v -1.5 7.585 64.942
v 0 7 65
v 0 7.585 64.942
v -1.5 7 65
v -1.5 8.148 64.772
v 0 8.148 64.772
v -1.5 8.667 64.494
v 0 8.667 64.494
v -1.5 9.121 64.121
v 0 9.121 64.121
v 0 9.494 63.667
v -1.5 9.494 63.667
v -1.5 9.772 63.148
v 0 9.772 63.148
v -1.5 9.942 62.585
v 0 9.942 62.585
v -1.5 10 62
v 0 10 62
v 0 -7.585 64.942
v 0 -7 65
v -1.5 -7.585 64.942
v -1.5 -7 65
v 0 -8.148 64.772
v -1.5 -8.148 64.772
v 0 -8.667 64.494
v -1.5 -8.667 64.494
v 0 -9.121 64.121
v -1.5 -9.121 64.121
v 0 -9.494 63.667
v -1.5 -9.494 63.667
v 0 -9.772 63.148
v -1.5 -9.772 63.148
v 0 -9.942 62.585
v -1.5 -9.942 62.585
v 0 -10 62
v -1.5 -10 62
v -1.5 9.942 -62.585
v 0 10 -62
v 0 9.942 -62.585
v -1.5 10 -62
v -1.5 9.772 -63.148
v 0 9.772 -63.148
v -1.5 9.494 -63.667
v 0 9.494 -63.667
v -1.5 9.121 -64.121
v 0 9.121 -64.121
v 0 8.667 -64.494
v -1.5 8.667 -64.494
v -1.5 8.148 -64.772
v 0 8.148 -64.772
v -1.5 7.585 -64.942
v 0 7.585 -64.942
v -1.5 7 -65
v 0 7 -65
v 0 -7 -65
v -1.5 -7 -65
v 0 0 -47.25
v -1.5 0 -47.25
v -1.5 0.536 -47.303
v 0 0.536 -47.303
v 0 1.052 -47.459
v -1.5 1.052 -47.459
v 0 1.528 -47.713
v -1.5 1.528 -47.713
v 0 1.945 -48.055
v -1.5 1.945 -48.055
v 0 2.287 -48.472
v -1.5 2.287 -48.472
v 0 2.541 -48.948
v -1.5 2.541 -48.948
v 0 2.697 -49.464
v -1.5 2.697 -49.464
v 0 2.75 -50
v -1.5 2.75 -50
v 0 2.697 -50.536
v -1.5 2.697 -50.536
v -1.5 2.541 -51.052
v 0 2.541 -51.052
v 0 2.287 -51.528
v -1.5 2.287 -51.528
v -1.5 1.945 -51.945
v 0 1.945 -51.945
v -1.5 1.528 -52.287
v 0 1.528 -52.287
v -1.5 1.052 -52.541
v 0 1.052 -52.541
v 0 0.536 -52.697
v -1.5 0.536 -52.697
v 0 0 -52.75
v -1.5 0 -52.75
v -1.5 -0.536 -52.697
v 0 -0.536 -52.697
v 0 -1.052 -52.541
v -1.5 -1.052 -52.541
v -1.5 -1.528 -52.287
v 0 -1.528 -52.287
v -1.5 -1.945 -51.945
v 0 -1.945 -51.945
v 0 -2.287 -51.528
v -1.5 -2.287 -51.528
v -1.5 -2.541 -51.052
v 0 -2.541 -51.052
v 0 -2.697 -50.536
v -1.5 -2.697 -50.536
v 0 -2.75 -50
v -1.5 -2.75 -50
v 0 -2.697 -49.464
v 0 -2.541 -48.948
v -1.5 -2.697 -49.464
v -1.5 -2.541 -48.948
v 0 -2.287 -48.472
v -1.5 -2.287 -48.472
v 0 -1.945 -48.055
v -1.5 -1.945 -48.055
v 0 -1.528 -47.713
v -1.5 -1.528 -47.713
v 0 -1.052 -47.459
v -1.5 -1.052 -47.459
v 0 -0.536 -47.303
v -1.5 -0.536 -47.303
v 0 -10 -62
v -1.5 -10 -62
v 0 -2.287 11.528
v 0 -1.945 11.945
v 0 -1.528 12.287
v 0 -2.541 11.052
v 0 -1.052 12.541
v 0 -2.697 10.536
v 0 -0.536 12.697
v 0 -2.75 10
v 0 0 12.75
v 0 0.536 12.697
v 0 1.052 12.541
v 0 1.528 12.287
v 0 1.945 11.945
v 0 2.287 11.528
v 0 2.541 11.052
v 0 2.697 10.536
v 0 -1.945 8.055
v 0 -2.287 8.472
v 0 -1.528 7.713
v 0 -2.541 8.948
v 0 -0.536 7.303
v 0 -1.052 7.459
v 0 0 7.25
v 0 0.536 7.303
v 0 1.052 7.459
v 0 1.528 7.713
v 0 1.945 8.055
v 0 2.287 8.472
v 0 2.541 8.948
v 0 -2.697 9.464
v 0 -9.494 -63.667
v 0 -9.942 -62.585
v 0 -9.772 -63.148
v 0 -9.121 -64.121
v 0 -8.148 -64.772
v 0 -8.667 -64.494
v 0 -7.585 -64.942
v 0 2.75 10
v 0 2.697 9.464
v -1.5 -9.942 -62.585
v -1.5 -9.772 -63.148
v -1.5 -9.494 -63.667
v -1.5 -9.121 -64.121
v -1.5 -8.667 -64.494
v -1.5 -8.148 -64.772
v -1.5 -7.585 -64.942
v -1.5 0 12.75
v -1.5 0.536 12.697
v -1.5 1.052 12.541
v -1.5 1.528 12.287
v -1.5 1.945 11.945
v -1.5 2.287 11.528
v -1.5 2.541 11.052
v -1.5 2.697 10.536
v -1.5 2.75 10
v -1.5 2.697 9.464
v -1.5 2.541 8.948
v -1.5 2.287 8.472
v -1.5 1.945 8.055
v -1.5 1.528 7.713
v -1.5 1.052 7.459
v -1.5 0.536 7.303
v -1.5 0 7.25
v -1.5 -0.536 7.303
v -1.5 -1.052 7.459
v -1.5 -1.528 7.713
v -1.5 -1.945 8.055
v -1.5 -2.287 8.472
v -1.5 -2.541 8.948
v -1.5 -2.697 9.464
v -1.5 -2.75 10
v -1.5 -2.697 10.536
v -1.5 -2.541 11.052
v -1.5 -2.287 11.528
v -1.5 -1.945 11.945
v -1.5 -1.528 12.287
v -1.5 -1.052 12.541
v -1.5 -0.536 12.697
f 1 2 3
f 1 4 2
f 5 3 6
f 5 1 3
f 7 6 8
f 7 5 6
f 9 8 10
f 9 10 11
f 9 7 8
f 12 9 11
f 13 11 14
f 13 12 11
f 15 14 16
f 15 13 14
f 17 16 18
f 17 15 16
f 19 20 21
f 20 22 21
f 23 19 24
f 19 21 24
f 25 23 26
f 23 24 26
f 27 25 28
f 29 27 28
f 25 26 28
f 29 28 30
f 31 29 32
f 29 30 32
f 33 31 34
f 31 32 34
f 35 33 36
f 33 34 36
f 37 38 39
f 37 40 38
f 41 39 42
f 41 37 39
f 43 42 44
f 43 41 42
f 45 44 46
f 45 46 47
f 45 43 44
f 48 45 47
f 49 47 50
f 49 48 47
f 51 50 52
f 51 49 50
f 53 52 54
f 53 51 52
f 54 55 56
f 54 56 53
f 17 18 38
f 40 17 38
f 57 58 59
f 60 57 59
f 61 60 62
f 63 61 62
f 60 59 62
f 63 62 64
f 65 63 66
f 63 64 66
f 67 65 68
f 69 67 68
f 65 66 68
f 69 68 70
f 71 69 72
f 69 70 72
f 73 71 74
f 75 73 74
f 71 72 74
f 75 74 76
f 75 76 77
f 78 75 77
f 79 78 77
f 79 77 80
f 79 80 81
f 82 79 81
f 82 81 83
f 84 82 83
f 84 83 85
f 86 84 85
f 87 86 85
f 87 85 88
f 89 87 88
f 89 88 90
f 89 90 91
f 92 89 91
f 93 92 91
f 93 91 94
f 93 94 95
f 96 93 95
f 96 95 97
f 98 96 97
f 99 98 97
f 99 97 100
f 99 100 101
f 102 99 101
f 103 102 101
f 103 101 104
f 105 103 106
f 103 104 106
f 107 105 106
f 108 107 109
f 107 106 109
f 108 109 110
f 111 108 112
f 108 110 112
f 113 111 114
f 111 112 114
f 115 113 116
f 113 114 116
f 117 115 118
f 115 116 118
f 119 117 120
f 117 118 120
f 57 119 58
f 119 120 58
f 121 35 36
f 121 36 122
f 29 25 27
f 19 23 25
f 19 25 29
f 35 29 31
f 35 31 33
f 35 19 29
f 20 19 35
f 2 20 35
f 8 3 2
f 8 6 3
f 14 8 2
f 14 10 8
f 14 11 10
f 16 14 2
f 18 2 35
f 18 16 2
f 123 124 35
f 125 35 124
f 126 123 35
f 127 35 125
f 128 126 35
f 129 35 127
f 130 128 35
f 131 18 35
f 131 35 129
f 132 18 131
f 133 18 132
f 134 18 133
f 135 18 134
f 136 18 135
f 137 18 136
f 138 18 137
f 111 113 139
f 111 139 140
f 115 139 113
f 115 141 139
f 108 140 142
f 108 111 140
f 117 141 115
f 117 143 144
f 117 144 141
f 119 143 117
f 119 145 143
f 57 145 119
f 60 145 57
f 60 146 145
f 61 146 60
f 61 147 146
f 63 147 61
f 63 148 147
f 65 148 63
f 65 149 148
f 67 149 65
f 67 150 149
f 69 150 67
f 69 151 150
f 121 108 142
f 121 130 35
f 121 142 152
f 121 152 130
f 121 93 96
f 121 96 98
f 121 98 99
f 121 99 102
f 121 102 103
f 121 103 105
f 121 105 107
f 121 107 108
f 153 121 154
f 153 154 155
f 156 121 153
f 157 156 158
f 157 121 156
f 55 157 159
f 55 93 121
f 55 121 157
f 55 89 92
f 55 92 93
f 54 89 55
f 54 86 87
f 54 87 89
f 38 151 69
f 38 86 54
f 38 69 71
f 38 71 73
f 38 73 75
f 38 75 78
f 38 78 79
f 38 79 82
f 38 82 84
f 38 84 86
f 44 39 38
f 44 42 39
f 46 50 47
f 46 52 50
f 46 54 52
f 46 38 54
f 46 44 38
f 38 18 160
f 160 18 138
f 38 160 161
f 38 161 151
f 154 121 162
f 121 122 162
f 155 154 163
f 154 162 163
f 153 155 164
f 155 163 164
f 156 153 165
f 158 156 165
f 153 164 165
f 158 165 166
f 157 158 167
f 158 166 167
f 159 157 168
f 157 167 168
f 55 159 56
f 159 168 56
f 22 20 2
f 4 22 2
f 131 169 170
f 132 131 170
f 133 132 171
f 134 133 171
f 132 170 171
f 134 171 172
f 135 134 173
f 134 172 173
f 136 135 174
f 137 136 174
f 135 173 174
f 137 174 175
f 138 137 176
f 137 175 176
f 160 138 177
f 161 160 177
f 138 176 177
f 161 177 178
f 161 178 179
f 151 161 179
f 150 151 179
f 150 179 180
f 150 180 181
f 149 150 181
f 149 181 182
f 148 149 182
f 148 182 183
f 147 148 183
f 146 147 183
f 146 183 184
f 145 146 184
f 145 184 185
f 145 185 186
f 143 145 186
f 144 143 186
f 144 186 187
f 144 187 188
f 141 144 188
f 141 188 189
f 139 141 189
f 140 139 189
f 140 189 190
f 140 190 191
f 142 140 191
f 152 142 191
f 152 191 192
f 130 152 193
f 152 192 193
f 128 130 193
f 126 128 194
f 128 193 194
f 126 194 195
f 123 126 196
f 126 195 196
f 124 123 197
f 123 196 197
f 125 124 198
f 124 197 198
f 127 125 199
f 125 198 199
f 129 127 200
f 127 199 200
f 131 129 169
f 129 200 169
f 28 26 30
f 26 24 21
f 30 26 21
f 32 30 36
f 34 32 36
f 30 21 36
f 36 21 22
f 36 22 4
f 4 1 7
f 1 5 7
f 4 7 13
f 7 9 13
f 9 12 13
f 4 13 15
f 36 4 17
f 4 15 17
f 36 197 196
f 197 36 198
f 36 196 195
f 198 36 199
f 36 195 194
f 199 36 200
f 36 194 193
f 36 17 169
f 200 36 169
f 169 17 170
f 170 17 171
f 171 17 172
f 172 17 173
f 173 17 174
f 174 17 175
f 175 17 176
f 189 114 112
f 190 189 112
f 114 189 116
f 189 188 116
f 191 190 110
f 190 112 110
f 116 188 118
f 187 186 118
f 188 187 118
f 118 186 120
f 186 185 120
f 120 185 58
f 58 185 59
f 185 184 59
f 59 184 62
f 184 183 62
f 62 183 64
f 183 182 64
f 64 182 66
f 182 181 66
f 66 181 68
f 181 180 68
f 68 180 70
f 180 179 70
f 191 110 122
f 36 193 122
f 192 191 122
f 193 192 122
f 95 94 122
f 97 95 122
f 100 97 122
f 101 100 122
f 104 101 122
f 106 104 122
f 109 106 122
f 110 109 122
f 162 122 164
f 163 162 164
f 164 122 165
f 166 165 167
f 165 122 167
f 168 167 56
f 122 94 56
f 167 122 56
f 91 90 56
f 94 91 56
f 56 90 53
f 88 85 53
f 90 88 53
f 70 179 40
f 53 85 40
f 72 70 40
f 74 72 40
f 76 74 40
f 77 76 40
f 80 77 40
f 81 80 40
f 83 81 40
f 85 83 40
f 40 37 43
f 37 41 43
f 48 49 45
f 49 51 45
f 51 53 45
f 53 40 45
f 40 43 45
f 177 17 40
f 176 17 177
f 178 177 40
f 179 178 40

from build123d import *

# Parameters (mm, degrees)
SZKIC1_W                = 130
SZKIC1_H                = 20
ODGI_CIE_BAZOWE1_DEPTH  = 1.5
OTW_R_POD_RUB_M51_D     = 5.5
OTW_R_POD_RUB_M51_DEPTH = 10
OTW_R_POD_RUB_M51_TIP   = 1.652366702
ZAOKR_GLENIE1_R         = 3


# Sheet-metal steps are written as plain solids
with BuildPart() as part:
    # Szkic1 → Odgięcie bazowe1 (new body)
    with BuildSketch(Plane(origin=(0, 0, 0), x_dir=(0, 0, -1), z_dir=(1, 0, 0))):
        Rectangle(SZKIC1_W, SZKIC1_H)
    extrude(amount=-ODGI_CIE_BAZOWE1_DEPTH)

    # Otwór pod śrubę M51
    with Locations(Plane(origin=(0, 0, 0), x_dir=(0, 0, -1), z_dir=(1, 0, 0))):
        with Locations((-10, 0), (50, 0)):
            Hole(OTW_R_POD_RUB_M51_D / 2, depth=OTW_R_POD_RUB_M51_DEPTH)
            with Locations((0, 0, -(OTW_R_POD_RUB_M51_DEPTH + OTW_R_POD_RUB_M51_TIP / 2))):  # 118° drill point
                Cone(0, OTW_R_POD_RUB_M51_D / 2, OTW_R_POD_RUB_M51_TIP, mode=Mode.SUBTRACT)

    # Zaokrąglenie1
    zaokr_glenie1_edges = [part.edges().sort_by_distance(p)[0] for p in [
        (-0.75, -10, -65),
        (-0.75, -10, 65),
        (-0.75, 10, 65),
        (-0.75, 10, -65),
    ]]
    fillet(zaokr_glenie1_edges, radius=ZAOKR_GLENIE1_R)


solid = part.part
